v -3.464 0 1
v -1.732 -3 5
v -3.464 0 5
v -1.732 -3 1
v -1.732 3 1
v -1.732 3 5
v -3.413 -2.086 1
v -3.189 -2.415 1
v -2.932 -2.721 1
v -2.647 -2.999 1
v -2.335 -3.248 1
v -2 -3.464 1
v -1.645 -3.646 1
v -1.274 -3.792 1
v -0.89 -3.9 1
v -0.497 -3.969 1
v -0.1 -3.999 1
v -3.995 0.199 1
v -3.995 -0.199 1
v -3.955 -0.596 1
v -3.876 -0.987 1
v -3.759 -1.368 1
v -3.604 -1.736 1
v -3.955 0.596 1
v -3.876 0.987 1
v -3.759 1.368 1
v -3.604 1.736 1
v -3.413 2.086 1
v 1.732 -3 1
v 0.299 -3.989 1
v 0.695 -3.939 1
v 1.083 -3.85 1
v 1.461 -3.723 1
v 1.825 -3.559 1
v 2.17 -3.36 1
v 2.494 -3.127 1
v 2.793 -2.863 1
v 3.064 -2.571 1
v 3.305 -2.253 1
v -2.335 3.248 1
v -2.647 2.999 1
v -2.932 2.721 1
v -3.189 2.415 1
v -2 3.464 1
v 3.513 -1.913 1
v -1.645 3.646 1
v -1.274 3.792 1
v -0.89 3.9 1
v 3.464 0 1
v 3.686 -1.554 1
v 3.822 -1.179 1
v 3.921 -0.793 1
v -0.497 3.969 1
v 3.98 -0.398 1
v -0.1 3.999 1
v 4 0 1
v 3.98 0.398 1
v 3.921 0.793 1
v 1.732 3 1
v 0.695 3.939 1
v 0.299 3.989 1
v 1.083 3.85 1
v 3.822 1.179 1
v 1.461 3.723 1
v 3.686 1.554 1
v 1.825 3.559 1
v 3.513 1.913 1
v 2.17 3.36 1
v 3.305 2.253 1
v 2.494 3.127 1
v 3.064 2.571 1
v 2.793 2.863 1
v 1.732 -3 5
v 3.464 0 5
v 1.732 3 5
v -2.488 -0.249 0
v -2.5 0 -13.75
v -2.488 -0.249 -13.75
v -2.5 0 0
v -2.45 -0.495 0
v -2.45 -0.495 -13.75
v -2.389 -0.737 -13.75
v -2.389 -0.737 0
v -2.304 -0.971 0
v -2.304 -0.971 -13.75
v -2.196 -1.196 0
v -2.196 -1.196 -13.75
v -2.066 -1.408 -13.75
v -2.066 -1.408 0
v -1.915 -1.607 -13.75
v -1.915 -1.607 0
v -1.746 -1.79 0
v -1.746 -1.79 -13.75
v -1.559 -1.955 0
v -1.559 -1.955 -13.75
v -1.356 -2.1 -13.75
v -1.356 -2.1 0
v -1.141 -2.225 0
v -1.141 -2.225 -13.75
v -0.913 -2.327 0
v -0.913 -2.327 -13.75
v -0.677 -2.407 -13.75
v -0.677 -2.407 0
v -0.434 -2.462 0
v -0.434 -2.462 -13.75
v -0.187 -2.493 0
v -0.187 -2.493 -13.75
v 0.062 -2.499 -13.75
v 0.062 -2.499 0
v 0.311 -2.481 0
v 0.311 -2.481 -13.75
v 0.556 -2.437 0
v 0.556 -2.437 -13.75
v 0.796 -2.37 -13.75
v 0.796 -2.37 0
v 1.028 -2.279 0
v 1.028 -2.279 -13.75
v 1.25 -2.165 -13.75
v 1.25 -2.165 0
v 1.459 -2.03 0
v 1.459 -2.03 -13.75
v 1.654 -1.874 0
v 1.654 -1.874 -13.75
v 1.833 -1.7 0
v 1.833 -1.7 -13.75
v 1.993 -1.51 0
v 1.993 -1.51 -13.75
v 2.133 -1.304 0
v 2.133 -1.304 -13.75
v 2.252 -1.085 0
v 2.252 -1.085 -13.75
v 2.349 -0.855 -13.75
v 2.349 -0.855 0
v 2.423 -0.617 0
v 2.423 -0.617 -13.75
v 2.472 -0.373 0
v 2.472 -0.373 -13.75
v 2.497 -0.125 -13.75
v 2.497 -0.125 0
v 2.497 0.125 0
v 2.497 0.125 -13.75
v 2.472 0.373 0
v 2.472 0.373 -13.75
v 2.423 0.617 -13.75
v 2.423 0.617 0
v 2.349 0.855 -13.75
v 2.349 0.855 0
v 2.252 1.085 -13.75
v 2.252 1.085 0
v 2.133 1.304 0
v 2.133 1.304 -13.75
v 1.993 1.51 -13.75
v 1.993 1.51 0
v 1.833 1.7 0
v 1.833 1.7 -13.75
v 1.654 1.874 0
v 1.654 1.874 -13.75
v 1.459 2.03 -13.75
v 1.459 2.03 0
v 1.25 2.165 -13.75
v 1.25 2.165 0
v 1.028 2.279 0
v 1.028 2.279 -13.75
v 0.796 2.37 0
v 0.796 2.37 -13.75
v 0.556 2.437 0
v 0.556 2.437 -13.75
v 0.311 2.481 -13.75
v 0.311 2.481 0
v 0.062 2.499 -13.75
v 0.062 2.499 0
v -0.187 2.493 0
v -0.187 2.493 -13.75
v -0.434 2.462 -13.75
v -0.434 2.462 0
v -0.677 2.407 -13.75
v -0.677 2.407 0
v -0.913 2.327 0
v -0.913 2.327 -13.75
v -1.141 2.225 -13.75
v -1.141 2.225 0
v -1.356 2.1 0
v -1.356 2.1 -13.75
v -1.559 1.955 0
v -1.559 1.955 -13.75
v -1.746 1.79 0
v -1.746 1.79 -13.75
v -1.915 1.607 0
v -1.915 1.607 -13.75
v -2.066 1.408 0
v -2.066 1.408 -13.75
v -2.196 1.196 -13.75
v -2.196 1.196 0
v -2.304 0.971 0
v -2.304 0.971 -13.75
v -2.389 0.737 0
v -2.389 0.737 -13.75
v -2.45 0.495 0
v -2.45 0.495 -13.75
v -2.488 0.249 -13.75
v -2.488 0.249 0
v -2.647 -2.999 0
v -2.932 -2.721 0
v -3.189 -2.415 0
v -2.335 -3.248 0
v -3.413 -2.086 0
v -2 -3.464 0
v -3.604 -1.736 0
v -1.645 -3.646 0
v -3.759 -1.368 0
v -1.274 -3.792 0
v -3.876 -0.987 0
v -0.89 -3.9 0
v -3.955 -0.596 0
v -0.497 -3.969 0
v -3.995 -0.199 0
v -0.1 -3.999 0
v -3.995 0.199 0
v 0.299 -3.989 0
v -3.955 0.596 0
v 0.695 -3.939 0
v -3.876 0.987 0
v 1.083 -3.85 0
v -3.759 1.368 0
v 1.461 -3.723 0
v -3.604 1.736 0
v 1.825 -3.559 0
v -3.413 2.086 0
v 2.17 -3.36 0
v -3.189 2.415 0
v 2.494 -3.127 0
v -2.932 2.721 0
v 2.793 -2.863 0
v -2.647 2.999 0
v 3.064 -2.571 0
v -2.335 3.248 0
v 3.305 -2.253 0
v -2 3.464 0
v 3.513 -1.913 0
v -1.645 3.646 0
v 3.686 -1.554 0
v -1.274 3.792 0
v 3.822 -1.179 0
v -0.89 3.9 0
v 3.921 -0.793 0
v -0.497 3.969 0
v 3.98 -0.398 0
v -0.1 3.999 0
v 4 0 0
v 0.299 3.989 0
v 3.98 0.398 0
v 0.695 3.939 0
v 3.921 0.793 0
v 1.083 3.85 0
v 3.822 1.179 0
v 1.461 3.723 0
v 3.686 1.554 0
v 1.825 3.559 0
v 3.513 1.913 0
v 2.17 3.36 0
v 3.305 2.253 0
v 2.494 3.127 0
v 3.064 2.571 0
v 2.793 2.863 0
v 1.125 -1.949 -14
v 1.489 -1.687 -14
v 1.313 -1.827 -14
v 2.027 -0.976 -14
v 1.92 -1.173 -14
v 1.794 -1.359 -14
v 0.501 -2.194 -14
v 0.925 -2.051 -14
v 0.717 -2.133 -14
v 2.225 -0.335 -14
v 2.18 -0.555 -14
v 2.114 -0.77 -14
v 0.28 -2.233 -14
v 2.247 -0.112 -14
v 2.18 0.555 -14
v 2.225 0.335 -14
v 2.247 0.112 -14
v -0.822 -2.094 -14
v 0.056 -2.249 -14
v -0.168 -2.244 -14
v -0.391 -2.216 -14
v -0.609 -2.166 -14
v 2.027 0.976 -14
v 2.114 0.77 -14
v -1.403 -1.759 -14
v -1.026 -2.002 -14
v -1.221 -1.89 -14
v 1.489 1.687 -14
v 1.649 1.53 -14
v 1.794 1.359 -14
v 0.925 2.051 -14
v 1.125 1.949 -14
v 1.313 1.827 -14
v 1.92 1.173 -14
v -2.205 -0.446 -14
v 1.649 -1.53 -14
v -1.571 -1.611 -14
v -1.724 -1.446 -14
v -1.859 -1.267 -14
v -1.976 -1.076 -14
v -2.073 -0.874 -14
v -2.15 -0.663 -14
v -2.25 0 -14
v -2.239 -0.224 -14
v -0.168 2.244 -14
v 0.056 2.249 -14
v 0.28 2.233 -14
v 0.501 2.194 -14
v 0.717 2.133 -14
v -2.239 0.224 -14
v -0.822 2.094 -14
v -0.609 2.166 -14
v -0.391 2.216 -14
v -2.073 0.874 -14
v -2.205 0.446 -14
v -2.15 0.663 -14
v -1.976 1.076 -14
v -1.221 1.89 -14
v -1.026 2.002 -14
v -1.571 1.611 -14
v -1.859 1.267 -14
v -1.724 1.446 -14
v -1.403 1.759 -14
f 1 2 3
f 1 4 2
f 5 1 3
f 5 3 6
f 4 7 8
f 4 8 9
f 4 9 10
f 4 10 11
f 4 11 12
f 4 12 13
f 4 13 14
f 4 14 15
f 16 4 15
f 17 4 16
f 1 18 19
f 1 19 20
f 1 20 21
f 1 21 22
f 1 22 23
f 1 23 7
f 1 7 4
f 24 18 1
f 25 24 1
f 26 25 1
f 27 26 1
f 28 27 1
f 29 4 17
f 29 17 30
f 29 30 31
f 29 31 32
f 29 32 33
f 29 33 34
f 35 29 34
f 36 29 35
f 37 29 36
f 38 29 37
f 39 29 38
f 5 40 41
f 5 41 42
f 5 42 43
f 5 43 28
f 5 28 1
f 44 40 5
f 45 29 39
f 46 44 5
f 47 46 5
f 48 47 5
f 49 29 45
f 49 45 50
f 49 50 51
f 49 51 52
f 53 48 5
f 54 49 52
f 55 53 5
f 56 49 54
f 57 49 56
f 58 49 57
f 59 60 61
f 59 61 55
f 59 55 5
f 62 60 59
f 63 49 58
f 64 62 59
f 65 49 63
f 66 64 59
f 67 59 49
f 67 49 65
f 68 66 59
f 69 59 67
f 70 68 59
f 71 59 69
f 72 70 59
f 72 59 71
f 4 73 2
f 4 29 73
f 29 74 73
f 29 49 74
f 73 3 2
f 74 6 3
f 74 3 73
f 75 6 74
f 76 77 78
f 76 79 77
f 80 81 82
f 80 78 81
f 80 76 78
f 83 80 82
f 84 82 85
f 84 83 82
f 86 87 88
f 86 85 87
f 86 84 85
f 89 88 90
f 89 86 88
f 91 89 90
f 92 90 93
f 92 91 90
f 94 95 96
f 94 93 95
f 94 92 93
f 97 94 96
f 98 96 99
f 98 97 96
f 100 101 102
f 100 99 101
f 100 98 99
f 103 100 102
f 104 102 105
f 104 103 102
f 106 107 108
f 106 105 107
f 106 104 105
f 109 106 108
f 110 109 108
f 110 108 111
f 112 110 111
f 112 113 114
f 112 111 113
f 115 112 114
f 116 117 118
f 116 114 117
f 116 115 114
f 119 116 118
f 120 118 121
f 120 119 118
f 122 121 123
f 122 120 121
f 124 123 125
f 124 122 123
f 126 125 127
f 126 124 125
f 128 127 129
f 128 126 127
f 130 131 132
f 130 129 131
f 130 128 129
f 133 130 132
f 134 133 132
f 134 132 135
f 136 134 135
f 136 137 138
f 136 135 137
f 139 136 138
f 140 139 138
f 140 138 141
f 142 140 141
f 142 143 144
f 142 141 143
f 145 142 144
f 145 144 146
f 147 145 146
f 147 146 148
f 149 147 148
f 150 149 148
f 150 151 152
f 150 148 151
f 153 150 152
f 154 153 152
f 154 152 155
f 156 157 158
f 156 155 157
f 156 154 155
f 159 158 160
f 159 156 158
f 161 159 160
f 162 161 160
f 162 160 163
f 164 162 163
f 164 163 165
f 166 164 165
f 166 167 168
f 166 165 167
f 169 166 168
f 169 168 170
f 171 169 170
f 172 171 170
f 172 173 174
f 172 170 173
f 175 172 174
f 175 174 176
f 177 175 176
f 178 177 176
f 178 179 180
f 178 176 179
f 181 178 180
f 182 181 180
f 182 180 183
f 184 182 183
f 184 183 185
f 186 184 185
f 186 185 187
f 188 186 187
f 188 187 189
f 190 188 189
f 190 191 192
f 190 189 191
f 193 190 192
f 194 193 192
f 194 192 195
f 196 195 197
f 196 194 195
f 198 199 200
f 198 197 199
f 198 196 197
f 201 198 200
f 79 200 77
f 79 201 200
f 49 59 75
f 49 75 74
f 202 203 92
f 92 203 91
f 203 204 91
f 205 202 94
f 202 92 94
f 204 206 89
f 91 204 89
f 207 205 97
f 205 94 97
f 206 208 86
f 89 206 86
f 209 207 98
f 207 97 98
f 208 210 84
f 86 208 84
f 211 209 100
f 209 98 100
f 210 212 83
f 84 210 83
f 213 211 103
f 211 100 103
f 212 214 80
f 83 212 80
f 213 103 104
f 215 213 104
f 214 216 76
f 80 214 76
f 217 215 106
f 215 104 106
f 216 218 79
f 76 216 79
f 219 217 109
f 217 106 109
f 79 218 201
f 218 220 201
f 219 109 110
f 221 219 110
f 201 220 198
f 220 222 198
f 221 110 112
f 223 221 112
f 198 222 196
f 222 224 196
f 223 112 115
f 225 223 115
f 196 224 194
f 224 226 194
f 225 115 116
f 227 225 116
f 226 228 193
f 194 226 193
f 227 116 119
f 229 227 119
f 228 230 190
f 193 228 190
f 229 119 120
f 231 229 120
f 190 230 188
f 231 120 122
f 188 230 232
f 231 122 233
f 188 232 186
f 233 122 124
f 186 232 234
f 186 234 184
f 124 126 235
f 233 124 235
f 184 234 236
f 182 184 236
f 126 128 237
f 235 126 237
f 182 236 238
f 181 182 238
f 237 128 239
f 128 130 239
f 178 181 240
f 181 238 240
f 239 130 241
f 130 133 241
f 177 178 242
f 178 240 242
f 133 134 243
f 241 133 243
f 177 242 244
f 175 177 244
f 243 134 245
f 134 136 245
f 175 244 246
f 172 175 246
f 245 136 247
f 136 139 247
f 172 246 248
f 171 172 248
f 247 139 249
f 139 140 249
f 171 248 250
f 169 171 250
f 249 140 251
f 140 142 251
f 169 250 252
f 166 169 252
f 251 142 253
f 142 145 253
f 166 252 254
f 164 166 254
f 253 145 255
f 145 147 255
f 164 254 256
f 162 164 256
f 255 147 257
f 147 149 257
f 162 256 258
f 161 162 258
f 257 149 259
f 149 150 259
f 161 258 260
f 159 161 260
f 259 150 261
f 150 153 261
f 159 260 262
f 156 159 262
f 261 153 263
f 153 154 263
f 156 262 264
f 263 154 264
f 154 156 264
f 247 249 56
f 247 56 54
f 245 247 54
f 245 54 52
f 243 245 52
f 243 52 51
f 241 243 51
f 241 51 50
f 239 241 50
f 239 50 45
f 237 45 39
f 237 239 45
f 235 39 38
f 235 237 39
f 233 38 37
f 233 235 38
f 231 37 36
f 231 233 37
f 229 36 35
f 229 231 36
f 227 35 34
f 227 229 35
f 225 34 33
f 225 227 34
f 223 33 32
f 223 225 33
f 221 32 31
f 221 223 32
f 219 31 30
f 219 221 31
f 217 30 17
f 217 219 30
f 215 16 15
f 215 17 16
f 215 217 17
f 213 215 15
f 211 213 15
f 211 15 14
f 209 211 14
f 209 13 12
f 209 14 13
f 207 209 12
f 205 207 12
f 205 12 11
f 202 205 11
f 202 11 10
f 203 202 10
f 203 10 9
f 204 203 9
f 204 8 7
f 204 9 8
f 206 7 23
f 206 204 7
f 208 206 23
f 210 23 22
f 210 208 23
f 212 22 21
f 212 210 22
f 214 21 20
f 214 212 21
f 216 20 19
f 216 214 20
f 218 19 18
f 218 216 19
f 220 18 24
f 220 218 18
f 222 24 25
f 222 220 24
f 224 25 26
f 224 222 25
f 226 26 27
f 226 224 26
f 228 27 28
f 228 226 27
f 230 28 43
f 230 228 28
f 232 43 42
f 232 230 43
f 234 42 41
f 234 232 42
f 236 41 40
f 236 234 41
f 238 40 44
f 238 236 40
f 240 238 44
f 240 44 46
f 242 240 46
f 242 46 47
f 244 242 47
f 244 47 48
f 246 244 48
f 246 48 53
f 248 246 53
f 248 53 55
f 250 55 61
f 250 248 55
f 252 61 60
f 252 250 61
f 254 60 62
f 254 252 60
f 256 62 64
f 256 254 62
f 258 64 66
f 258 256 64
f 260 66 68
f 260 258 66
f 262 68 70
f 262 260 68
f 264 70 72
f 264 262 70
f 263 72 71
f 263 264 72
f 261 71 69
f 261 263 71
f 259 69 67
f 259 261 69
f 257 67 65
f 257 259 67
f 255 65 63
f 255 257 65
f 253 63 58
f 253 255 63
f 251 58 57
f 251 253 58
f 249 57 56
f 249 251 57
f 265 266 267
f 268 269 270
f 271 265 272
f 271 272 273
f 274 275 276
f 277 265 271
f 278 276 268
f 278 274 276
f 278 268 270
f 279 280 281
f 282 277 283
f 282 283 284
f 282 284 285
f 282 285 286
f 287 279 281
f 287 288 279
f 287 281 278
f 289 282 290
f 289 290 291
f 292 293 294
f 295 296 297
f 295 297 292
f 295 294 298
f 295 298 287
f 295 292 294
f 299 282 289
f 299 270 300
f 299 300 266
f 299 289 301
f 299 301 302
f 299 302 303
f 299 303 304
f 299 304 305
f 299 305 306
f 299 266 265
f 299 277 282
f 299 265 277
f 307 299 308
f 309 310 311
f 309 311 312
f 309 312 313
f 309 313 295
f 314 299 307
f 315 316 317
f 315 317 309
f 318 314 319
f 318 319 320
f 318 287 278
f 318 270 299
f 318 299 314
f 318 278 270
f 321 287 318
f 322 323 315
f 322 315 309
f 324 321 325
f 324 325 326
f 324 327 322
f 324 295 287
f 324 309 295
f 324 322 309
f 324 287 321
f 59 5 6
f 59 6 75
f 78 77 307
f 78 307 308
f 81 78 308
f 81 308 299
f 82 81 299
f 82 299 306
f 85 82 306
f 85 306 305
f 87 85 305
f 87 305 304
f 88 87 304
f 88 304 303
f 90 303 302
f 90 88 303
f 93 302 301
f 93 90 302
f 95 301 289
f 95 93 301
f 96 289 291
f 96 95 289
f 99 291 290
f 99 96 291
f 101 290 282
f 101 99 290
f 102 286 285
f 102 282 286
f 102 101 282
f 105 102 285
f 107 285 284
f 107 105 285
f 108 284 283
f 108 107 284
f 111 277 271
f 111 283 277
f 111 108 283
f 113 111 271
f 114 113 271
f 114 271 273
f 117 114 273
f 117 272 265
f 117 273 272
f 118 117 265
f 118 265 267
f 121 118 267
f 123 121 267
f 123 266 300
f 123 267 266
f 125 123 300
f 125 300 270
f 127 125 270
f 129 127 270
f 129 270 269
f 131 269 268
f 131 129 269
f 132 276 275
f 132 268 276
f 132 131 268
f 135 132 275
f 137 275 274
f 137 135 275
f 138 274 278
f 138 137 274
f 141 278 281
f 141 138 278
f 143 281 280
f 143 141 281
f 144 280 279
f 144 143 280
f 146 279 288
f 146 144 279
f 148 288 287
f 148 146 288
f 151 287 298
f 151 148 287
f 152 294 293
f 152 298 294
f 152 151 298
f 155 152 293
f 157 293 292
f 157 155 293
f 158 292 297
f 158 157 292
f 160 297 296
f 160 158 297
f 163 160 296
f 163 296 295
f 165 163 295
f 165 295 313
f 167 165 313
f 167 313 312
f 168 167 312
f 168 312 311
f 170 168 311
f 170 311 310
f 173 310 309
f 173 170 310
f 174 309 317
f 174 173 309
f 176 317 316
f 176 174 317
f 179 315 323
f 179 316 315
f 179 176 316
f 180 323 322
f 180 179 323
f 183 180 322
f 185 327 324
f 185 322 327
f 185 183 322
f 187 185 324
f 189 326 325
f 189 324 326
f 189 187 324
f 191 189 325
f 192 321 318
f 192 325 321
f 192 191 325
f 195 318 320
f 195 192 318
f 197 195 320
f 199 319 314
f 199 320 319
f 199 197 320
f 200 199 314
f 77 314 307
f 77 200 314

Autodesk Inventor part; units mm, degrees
ref_plane "YZ Plane" through (0, 0, 0) normal (1, 0, 0) x (0, 1, 0)
ref_plane "XZ Plane" through (0, 0, 0) normal (0, 1, 0) x (-1, 0, 0)
ref_plane "XY Plane" through (0, 0, 0) normal (0, 0, 1) x (1, 0, 0)
sketch "草图1" plane through (0, 0, 0) normal (0, 0, 1) x (1, 0, 0)
  circle A0 centre (0, 0) radius 4
  dimension "d0" = 8
extrude "拉伸1" add sketch "草图1" along normal blind 1
sketch "草图2" plane through (0, 0, 1) normal (0, 0, 1) x (1, 0, 0)
  line L0 (1.7321, -3) -> (-1.7321, -3)
  line L1 (-1.7321, -3) -> (-3.4641, 0)
  line L2 (-3.4641, 0) -> (-1.7321, 3)
  line L3 (-1.7321, 3) -> (1.7321, 3)
  line L4 (1.7321, 3) -> (3.4641, 0)
  line L5 (3.4641, 0) -> (1.7321, -3)
  line L6 (0, 0) -> (0, 3)
  dimension "d3" = 6
extrude "拉伸2" add sketch "草图2" along normal blind 4
sketch "草图3" plane through (0, 0, 0) normal (0, 0, -1) x (-1, 0, 0)
  circle A0 centre (0, 0) radius 2.5
  dimension "d6" = 5
extrude "拉伸3" add sketch "草图3" along normal blind 14
thread "螺纹1" size "M5x0.8" class "6g" standard "ANSI Metric M Profile" length 5
chamfer "倒角1" distance 0.25 angle 45 1 edges at (2.5, 0, -14)
properties part number "分离水箱固定螺丝"
